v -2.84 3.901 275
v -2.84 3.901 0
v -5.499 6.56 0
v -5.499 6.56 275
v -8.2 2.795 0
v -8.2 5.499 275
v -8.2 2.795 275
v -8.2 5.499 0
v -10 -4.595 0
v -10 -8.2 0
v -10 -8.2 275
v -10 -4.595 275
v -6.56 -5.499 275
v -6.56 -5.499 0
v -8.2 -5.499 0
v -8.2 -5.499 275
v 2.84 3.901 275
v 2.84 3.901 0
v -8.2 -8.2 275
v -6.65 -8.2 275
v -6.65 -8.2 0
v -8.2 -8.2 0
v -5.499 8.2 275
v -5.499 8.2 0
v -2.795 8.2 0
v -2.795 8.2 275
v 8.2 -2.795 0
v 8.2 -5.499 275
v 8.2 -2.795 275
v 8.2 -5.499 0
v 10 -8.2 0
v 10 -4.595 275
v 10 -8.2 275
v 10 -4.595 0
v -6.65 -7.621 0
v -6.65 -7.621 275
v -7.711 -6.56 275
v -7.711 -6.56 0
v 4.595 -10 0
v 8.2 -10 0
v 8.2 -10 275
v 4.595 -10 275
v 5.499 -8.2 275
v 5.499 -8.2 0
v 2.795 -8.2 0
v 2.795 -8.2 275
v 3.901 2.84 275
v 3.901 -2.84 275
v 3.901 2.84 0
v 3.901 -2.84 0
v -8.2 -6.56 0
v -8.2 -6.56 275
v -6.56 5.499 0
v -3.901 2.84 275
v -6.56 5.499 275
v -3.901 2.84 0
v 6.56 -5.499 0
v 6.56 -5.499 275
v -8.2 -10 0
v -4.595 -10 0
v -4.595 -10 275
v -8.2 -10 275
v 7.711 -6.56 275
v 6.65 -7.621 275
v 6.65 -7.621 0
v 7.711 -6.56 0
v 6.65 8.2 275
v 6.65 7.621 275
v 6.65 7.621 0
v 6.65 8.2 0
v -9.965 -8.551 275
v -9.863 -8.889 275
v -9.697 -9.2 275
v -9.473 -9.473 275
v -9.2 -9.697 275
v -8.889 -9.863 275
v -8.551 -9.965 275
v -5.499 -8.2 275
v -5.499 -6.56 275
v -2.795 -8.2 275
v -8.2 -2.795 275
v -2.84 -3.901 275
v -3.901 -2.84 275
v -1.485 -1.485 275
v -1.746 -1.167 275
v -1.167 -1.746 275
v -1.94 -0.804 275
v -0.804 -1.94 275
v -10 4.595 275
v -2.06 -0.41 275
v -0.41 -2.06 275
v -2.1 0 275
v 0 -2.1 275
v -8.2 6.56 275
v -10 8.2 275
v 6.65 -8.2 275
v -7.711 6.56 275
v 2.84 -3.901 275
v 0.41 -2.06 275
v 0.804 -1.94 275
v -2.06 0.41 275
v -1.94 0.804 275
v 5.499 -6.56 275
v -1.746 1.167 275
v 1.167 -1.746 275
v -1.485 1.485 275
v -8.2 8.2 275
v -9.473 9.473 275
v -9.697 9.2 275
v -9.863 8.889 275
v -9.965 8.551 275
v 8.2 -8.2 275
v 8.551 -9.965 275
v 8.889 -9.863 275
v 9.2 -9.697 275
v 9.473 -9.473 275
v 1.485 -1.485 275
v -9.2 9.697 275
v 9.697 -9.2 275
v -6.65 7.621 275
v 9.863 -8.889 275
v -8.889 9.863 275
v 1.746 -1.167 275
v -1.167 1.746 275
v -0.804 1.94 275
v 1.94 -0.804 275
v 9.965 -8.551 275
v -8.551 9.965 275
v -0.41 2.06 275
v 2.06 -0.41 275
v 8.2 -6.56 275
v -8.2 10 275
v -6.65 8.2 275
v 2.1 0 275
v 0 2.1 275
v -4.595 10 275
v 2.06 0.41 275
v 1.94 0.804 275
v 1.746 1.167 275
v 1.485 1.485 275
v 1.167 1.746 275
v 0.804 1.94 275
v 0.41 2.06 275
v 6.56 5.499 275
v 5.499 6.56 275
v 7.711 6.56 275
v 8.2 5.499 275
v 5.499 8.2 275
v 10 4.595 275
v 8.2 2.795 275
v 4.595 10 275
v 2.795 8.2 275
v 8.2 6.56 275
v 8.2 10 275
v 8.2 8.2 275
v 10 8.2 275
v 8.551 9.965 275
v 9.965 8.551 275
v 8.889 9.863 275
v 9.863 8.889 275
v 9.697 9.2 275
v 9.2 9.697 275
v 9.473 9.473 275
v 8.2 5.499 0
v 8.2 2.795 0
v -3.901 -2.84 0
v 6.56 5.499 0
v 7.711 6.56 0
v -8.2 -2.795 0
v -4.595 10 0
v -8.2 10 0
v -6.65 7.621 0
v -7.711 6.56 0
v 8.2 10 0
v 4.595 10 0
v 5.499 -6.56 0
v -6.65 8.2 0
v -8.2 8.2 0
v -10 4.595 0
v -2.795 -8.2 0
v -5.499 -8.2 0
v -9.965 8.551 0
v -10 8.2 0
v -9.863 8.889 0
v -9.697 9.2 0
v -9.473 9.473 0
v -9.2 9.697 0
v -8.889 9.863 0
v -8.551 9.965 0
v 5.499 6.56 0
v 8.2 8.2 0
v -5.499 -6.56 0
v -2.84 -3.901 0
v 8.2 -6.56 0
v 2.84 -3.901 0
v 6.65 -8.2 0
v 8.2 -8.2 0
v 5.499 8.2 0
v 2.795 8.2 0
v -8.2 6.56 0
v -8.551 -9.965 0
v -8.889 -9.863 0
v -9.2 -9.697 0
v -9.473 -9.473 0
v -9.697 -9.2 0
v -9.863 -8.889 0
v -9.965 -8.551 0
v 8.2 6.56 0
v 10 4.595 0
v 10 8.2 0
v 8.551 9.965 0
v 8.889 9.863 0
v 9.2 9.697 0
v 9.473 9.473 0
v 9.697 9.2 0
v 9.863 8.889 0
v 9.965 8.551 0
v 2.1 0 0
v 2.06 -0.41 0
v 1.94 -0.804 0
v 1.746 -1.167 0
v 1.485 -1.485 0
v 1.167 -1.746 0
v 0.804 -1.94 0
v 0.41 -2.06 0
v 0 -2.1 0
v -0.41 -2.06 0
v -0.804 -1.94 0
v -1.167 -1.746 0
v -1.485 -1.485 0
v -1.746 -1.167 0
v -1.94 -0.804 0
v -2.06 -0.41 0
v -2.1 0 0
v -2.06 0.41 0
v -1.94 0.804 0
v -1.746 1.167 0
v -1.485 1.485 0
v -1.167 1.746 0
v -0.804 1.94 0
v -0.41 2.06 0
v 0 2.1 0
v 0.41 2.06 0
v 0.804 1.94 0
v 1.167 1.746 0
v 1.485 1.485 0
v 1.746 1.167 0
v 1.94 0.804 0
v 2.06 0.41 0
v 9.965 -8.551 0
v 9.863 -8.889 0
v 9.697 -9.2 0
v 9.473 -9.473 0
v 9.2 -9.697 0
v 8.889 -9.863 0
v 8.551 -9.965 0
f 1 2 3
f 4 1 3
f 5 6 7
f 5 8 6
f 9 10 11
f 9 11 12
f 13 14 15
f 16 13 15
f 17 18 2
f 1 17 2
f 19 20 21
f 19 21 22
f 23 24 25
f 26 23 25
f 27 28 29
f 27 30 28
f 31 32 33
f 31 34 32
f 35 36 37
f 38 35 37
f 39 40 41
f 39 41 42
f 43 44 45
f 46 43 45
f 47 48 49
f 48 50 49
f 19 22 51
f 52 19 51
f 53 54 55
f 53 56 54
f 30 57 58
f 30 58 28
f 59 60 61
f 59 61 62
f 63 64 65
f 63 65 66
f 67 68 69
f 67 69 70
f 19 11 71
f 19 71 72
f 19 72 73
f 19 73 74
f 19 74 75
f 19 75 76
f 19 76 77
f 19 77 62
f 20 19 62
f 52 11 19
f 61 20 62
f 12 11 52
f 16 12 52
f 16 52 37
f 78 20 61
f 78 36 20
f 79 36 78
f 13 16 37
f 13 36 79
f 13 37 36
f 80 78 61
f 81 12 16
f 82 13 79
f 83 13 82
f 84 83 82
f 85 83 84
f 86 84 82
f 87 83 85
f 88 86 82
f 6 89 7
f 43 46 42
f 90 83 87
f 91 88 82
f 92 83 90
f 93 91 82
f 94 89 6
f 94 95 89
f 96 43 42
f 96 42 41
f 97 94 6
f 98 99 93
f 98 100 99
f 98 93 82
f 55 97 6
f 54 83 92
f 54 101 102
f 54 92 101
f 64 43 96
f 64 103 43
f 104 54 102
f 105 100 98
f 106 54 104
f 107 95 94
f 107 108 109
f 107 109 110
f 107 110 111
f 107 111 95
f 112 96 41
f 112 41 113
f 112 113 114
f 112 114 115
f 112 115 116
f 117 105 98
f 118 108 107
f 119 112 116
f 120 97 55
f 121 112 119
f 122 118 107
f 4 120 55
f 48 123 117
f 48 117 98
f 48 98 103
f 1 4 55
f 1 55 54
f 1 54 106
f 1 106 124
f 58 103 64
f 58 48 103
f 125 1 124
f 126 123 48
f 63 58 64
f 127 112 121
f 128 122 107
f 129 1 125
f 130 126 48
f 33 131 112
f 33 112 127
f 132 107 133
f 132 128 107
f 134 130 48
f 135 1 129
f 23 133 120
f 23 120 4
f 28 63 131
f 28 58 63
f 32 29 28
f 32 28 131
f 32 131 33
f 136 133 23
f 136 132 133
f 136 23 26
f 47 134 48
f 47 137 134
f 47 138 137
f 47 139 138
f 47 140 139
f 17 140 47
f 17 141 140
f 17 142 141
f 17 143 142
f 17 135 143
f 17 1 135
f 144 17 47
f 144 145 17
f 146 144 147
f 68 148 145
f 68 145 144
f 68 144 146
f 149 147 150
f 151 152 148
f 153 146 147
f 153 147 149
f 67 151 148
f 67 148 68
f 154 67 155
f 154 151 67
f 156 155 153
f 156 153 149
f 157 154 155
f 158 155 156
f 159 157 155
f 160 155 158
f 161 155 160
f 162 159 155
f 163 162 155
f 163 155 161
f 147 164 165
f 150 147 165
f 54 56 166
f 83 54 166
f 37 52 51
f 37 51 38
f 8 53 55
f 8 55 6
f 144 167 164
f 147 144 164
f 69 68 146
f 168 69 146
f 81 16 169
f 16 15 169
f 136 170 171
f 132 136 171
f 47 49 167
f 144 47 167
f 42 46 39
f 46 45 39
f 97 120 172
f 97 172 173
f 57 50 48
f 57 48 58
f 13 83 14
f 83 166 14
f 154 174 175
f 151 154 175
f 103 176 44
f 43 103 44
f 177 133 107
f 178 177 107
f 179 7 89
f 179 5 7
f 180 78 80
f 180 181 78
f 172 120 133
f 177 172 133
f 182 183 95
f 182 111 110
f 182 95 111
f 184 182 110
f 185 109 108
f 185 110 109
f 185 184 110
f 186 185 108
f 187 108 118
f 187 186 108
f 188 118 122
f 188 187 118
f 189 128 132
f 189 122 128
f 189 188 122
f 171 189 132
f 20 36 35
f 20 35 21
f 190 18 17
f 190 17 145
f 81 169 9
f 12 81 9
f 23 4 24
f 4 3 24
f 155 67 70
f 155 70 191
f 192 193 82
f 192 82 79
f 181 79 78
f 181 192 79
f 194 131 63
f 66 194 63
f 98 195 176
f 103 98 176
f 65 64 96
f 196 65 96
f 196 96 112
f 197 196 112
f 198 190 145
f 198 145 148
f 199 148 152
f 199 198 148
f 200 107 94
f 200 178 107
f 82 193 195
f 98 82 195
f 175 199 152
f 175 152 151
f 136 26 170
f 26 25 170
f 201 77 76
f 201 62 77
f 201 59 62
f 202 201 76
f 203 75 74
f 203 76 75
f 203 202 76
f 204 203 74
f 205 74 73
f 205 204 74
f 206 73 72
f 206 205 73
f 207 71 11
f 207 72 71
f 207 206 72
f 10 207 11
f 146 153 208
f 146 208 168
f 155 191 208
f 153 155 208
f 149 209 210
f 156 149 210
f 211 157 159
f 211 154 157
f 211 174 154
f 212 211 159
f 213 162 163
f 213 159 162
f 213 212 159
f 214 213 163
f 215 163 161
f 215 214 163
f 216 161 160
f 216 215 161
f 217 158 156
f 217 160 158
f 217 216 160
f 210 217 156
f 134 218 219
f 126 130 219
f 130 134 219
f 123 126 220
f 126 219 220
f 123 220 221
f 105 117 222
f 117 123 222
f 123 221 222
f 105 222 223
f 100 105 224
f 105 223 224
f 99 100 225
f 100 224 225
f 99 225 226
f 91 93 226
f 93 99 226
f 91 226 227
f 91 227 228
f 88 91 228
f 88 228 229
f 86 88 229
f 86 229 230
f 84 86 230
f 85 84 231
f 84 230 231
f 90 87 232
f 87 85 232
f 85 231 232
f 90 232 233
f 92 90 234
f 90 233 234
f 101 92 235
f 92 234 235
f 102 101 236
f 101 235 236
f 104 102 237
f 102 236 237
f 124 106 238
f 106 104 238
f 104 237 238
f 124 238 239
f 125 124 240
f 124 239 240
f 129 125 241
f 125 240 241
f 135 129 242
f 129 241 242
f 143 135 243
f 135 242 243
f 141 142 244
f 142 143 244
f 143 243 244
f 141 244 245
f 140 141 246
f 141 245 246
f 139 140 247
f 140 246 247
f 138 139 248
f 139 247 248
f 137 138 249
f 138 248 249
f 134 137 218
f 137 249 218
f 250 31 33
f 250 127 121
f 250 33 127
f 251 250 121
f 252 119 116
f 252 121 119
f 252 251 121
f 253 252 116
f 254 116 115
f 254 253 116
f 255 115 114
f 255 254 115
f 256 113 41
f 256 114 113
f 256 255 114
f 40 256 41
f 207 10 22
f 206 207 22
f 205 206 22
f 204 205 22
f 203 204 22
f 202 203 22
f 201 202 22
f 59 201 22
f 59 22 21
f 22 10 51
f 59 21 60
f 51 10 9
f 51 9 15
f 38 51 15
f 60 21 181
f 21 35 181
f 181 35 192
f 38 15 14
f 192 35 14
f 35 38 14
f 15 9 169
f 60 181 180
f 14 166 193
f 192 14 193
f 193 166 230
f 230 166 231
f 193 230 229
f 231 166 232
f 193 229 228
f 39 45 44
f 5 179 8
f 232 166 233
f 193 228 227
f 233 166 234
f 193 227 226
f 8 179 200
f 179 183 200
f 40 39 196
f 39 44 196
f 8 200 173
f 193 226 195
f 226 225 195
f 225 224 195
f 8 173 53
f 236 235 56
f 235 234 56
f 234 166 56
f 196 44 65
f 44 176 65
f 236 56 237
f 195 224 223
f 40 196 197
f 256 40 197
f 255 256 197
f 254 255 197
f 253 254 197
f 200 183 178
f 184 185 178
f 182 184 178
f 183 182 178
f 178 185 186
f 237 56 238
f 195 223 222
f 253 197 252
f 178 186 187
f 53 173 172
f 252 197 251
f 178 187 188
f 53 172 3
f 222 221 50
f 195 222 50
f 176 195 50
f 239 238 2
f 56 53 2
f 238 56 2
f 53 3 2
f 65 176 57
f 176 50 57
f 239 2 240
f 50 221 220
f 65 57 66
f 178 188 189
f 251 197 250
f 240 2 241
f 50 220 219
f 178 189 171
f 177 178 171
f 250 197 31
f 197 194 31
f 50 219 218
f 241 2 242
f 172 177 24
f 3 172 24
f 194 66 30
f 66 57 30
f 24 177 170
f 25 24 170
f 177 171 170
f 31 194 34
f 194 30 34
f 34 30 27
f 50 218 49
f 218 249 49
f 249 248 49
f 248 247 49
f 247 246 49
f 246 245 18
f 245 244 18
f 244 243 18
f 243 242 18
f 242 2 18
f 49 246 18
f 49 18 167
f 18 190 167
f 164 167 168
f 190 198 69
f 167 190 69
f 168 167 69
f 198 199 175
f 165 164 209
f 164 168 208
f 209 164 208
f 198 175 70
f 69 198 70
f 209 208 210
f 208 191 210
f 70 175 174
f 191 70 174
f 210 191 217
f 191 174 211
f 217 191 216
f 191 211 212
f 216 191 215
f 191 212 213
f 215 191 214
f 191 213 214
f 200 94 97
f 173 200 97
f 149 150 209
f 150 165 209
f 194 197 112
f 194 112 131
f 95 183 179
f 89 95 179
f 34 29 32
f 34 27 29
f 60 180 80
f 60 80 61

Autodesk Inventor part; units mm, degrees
ref_plane "YZ Plane" through (0, 0, 0) normal (1, 0, 0) x (0, 1, 0)
ref_plane "Start Plane" through (0, 0, 0) normal (0, 0, 1) x (1, 0, 0)
ref_plane "End Plane" through (0, 0, 275) normal (0, 0, 1) x (1, 0, 0)
sketch "Sketch" plane through (0, 0, 0) normal (0, 0, 1) x (1, 0, 0)
  line L0 (10, -4.5951) -> (10, -8.2)
  line L1 (-10, -8.2) -> (-10, -4.5951)
  line L2 (-10, 10) -> (10, -10) construction
  line L3 (10, 10) -> (-10, -10) construction
  circle A0 centre (0, 0) radius 2.1
  line L4 (-2.84, -3.9007) -> (2.84, -3.9007)
  line L5 (3.9007, -2.84) -> (3.9007, 2.84)
  line L6 (2.84, 3.9007) -> (-2.84, 3.9007)
  line L7 (-3.9007, 2.84) -> (-3.9007, -2.84)
  line L8 (-3.9007, -3.9007) -> (3.9007, 3.9007) construction
  line L9 (3.9007, -3.9007) -> (-3.9007, 3.9007) construction
  line L10 (-3.9007, -2.84) -> (-2.84, -3.9007) construction
  line L11 (-2.84, -3.9007) -> (-5.4993, -6.56)
  line L12 (-5.4993, -6.56) -> (-5.4993, -8.2)
  line L13 (-5.4993, -8.2) -> (-2.7951, -8.2)
  line L14 (-2.7951, -8.2) -> (-4.5951, -10)
  line L15 (0, 0) -> (0, -3.9007) construction
  line L16 (3.9007, -2.84) -> (2.84, -3.9007) construction
  line L17 (2.84, -3.9007) -> (5.4993, -6.56)
  line L18 (5.4993, -6.56) -> (5.4993, -8.2)
  line L19 (5.4993, -8.2) -> (2.7951, -8.2)
  line L20 (2.7951, -8.2) -> (4.5951, -10)
  line L21 (-2.84, -3.9007) -> (-3.9007, -2.84) construction
  line L22 (-3.9007, -2.84) -> (-6.56, -5.4993)
  line L23 (-6.56, -5.4993) -> (-8.2, -5.4993)
  line L24 (-8.2, -5.4993) -> (-8.2, -2.7951)
  line L25 (-8.2, -2.7951) -> (-10, -4.5951)
  line L26 (3.9007, -2.84) -> (6.56, -5.4993)
  line L27 (6.56, -5.4993) -> (8.2, -5.4993)
  line L28 (8.2, -5.4993) -> (8.2, -2.7951)
  line L29 (8.2, -2.7951) -> (10, -4.5951)
  arc A1 (-10, -8.2) -> (-8.2, -10) centre (-8.2, -8.2) ccw
  arc A2 (8.2, -10) -> (10, -8.2) centre (8.2, -8.2) ccw
  line L30 (-8.2, -6.56) -> (-7.7111, -6.56)
  line L31 (-6.6505, -8.2) -> (-8.2, -8.2)
  line L32 (-8.2, -8.2) -> (-8.2, -6.56)
  line L33 (-6.6505, -7.6207) -> (-7.7111, -6.56)
  line L34 (-6.6505, -7.6207) -> (-6.6505, -8.2)
  line L35 (8.2, -6.56) -> (7.7111, -6.56)
  line L36 (6.6505, -8.2) -> (8.2, -8.2)
  line L37 (8.2, -8.2) -> (8.2, -6.56)
  line L38 (6.6505, -7.6207) -> (7.7111, -6.56)
  line L39 (6.6505, -7.6207) -> (6.6505, -8.2)
  line L40 (8.2, -10) -> (4.5951, -10)
  line L41 (-4.5951, -10) -> (-8.2, -10)
  line L42 (-3.9007, 0) -> (3.9007, 0) construction
  line L43 (10, 4.5951) -> (10, 8.2)
  line L44 (-10, 8.2) -> (-10, 4.5951)
  line L45 (-2.84, 3.9007) -> (2.84, 3.9007)
  line L46 (-3.9007, 2.84) -> (-2.84, 3.9007) construction
  line L47 (-2.84, 3.9007) -> (-5.4993, 6.56)
  line L48 (-5.4993, 6.56) -> (-5.4993, 8.2)
  line L49 (-5.4993, 8.2) -> (-2.7951, 8.2)
  line L50 (-2.7951, 8.2) -> (-4.5951, 10)
  line L51 (2.84, 3.9007) -> (5.4993, 6.56)
  line L52 (5.4993, 6.56) -> (5.4993, 8.2)
  line L53 (5.4993, 8.2) -> (2.7951, 8.2)
  line L54 (2.7951, 8.2) -> (4.5951, 10)
  line L55 (3.9007, 2.84) -> (2.84, 3.9007) construction
  line L56 (-8.2, 2.7951) -> (-10, 4.5951)
  line L57 (-2.84, 3.9007) -> (-3.9007, 2.84) construction
  line L58 (-3.9007, 2.84) -> (-6.56, 5.4993)
  line L59 (-6.56, 5.4993) -> (-8.2, 5.4993)
  line L60 (-8.2, 5.4993) -> (-8.2, 2.7951)
  line L61 (3.9007, 2.84) -> (6.56, 5.4993)
  line L62 (6.56, 5.4993) -> (8.2, 5.4993)
  line L63 (8.2, 5.4993) -> (8.2, 2.7951)
  line L64 (8.2, 2.7951) -> (10, 4.5951)
  arc A3 (-8.2, 10) -> (-10, 8.2) centre (-8.2, 8.2) ccw
  arc A4 (10, 8.2) -> (8.2, 10) centre (8.2, 8.2) ccw
  line L65 (-8.2, 6.56) -> (-7.7111, 6.56)
  line L66 (-6.6505, 8.2) -> (-8.2, 8.2)
  line L67 (-8.2, 8.2) -> (-8.2, 6.56)
  line L68 (-6.6505, 7.6207) -> (-7.7111, 6.56)
  line L69 (-6.6505, 7.6207) -> (-6.6505, 8.2)
  line L70 (8.2, 6.56) -> (7.7111, 6.56)
  line L71 (6.6505, 7.6207) -> (7.7111, 6.56)
  line L72 (8.2, 8.2) -> (8.2, 6.56)
  line L73 (6.6505, 7.6207) -> (6.6505, 8.2)
  line L74 (6.6505, 8.2) -> (8.2, 8.2)
  line L75 (8.2, 10) -> (4.5951, 10)
  line L76 (-4.5951, 10) -> (-8.2, 10)
  line L77 (-8.2, 10) -> (-4.5951, 10)
  line L78 (4.5951, 10) -> (8.2, 10)
  point P0 (8.2, -8.2)
  point P1 (0, 3.9007)
  point P2 (8.2, 8.2)
  dimension "Width" = 20
  dimension "Height" = 20
  dimension "d2" = 4.2
  dimension "d3" = 1.5
  dimension "d4" = 1.64
  dimension "d6" = 5.68
  dimension "d7" = 1.8
  dimension "d9" = 1.5
extrude "Body" add sketch "Sketch" along normal up to surface (275 mm away) from surface at 0
sketch "Sketch4" plane through (0, 0, 0) normal (0, 0, 1) x (1, 0, 0)
  line L0 (0, 0) -> (10, 0)
ref_plane "Work Plane4" through (0, 0, 0) normal (0, -1, 0) x (1, 0, 0)
sketch "Sketch5" plane through (0, 0, 0) normal (0, -1, 0) x (1, 0, 0)
  line L0 (-2, 0) -> (12, 0) construction
  line L1 (-2, 275) -> (12, 275) construction
  dimension "d17" = 275
equation "\"G_OFFSET_START\" = 0"
equation "\"G_OFFSET_END\" = 0"
equation "\"d13\" = Length + G_OFFSET_END"
equation "\"G_L\" = d17"
equation "\"Length\" = 275"
properties part number "V-slot 20 mm x 20 mm" material "Aluminum 6061"
